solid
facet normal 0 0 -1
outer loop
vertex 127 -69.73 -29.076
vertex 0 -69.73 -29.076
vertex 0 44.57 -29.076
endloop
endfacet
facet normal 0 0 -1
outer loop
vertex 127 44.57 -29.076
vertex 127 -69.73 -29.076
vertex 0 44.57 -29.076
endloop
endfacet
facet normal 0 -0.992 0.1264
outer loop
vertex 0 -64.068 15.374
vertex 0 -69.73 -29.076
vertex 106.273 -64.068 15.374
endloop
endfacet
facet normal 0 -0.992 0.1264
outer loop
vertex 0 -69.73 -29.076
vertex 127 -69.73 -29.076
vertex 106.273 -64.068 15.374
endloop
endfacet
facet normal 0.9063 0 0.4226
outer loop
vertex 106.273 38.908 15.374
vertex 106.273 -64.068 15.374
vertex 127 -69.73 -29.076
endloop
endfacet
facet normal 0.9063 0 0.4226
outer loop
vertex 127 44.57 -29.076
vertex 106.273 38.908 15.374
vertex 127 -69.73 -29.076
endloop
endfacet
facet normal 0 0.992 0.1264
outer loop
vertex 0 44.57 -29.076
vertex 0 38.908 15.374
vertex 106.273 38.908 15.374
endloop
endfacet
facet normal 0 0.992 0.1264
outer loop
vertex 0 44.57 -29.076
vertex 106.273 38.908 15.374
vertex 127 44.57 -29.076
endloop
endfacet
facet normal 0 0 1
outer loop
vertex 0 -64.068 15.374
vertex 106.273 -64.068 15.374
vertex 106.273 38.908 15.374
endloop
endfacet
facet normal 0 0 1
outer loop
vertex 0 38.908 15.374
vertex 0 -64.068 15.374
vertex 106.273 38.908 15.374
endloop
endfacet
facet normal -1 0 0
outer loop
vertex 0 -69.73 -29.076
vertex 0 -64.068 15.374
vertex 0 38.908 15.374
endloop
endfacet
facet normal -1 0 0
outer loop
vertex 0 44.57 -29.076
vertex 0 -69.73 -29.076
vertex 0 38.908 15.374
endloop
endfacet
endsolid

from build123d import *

# Parameters (mm, degrees)
F0_W          = 114.3
F0_H          = 44.45
F1_DEPTH      = 127
F3_DEPTH      = 127
F7_DEPTH      = 139.954
F7_DEPTH_BACK = 86.614


with BuildPart() as f1:
    # F0 (on Right) → F1 (new body)
    with BuildSketch(Plane.YZ):
        with Locations((-12.579812, -6.85063)):
            Rectangle(F0_W, F0_H)
    extrude(amount=F1_DEPTH)

    # F2 (on Front) → F3 (cut, symmetric)
    with BuildSketch(Plane.XZ):
        Polygon((127, -29.07563), (127, 15.37437), (106.272625, 15.37437), align=None)
    extrude(amount=F3_DEPTH, both=True, mode=Mode.SUBTRACT)

    # F6 (on offset) → F7 (cut, two sides)
    with BuildSketch(Plane.YZ.offset(25.4)) as f7_sk:
        Polygon((-69.729812, 15.37437), (-69.729812, -29.07563), (-64.067963, 15.37437), align=None)
        Polygon((38.908338, 15.37437), (44.570188, -29.07563), (44.570188, 15.37437), align=None)
    extrude(amount=F7_DEPTH, mode=Mode.SUBTRACT)
    extrude(f7_sk.sketch, amount=-F7_DEPTH_BACK, mode=Mode.SUBTRACT)


solid = f1.part
